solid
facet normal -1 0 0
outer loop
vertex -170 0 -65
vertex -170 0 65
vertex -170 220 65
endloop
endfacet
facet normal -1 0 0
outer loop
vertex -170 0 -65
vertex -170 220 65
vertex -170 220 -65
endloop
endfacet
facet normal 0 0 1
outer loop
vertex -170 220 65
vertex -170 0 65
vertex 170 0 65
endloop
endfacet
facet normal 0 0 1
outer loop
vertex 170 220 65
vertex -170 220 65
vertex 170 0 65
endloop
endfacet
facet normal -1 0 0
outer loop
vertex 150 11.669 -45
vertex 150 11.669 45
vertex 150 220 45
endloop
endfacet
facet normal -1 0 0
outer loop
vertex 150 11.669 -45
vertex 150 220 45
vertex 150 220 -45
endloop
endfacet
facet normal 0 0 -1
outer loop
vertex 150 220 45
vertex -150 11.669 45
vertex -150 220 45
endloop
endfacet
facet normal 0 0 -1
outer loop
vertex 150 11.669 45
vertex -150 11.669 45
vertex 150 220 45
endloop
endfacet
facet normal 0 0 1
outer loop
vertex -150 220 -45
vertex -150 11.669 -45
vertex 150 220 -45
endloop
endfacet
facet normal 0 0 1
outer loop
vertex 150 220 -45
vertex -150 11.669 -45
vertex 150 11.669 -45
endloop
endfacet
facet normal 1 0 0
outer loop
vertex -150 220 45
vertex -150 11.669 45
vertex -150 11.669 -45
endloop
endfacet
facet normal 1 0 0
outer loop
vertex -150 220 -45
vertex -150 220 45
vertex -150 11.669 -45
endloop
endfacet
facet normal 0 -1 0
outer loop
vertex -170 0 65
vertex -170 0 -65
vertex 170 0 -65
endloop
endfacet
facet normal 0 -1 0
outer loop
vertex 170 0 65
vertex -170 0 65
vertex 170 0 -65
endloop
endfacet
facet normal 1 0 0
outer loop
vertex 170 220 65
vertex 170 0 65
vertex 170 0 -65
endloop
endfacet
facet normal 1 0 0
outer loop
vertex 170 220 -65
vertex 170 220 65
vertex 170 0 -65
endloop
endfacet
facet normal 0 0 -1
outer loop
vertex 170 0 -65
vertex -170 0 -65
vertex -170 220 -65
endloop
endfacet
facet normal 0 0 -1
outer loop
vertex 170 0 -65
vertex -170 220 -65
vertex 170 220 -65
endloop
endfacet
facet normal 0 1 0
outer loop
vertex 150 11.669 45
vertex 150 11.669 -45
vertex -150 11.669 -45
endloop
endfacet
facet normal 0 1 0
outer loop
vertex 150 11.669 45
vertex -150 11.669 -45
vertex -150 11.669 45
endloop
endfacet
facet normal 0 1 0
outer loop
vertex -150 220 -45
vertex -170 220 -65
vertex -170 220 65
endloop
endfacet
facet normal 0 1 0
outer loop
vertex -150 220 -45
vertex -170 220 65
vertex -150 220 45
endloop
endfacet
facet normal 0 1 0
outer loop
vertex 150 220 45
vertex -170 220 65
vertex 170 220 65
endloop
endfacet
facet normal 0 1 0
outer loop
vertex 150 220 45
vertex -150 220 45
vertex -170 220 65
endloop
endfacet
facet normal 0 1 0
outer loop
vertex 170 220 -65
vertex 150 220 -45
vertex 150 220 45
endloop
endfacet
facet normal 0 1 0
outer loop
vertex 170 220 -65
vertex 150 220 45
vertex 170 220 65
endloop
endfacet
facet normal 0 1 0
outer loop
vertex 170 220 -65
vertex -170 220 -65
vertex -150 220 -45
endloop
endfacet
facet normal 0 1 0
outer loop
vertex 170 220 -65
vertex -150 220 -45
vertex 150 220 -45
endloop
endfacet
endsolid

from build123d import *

# Parameters (mm, degrees)
SKETCH1_W           = 340
SKETCH1_H           = 130
SKETCH1_W_2         = 300
SKETCH1_H_2         = 90
BOSS_EXTRUDE1_DEPTH = 220
SKETCH1_2_W         = 340
SKETCH1_2_H         = 130
SKETCH1_2_W_2       = 300
SKETCH1_2_H_2       = 90
BOSS_EXTRUDE2_DEPTH = 220
BOSS_EXTRUDE3_REACH = 412.152
SKETCH2_W           = 130
SKETCH2_H           = 11.669014553


with BuildPart() as part:
    # Sketch1 → Boss-Extrude1 (new body)
    with BuildSketch(Plane(origin=(0, 0, 0), x_dir=(1, 0, 0), z_dir=(0, 1, 0))):
        Rectangle(SKETCH1_W, SKETCH1_H)
        Rectangle(SKETCH1_W_2, SKETCH1_H_2, mode=Mode.SUBTRACT)
    extrude(amount=BOSS_EXTRUDE1_DEPTH)

    # Sketch1<2> → Boss-Extrude2 (add)
    with BuildSketch(Plane(origin=(0, 0, 0), x_dir=(1, 0, 0), z_dir=(0, 1, 0))):
        Rectangle(SKETCH1_2_W, SKETCH1_2_H)
        Rectangle(SKETCH1_2_W_2, SKETCH1_2_H_2, mode=Mode.SUBTRACT)
    extrude(amount=BOSS_EXTRUDE2_DEPTH)

    # Sketch2 → Boss-Extrude3 (add, up to next)
    with BuildSketch(Plane.ZY.offset(170), mode=Mode.PRIVATE) as boss_extrude3_sk1:
        with Locations((0, 5.834507277)):
            Rectangle(SKETCH2_W, SKETCH2_H)
    boss_extrude3_tool1 = extrude(boss_extrude3_sk1.sketch, amount=-BOSS_EXTRUDE3_REACH, mode=Mode.PRIVATE) - part.part
    add(boss_extrude3_tool1.solids().sort_by_distance((-170, 5.834507, 0))[0])


solid = part.part
